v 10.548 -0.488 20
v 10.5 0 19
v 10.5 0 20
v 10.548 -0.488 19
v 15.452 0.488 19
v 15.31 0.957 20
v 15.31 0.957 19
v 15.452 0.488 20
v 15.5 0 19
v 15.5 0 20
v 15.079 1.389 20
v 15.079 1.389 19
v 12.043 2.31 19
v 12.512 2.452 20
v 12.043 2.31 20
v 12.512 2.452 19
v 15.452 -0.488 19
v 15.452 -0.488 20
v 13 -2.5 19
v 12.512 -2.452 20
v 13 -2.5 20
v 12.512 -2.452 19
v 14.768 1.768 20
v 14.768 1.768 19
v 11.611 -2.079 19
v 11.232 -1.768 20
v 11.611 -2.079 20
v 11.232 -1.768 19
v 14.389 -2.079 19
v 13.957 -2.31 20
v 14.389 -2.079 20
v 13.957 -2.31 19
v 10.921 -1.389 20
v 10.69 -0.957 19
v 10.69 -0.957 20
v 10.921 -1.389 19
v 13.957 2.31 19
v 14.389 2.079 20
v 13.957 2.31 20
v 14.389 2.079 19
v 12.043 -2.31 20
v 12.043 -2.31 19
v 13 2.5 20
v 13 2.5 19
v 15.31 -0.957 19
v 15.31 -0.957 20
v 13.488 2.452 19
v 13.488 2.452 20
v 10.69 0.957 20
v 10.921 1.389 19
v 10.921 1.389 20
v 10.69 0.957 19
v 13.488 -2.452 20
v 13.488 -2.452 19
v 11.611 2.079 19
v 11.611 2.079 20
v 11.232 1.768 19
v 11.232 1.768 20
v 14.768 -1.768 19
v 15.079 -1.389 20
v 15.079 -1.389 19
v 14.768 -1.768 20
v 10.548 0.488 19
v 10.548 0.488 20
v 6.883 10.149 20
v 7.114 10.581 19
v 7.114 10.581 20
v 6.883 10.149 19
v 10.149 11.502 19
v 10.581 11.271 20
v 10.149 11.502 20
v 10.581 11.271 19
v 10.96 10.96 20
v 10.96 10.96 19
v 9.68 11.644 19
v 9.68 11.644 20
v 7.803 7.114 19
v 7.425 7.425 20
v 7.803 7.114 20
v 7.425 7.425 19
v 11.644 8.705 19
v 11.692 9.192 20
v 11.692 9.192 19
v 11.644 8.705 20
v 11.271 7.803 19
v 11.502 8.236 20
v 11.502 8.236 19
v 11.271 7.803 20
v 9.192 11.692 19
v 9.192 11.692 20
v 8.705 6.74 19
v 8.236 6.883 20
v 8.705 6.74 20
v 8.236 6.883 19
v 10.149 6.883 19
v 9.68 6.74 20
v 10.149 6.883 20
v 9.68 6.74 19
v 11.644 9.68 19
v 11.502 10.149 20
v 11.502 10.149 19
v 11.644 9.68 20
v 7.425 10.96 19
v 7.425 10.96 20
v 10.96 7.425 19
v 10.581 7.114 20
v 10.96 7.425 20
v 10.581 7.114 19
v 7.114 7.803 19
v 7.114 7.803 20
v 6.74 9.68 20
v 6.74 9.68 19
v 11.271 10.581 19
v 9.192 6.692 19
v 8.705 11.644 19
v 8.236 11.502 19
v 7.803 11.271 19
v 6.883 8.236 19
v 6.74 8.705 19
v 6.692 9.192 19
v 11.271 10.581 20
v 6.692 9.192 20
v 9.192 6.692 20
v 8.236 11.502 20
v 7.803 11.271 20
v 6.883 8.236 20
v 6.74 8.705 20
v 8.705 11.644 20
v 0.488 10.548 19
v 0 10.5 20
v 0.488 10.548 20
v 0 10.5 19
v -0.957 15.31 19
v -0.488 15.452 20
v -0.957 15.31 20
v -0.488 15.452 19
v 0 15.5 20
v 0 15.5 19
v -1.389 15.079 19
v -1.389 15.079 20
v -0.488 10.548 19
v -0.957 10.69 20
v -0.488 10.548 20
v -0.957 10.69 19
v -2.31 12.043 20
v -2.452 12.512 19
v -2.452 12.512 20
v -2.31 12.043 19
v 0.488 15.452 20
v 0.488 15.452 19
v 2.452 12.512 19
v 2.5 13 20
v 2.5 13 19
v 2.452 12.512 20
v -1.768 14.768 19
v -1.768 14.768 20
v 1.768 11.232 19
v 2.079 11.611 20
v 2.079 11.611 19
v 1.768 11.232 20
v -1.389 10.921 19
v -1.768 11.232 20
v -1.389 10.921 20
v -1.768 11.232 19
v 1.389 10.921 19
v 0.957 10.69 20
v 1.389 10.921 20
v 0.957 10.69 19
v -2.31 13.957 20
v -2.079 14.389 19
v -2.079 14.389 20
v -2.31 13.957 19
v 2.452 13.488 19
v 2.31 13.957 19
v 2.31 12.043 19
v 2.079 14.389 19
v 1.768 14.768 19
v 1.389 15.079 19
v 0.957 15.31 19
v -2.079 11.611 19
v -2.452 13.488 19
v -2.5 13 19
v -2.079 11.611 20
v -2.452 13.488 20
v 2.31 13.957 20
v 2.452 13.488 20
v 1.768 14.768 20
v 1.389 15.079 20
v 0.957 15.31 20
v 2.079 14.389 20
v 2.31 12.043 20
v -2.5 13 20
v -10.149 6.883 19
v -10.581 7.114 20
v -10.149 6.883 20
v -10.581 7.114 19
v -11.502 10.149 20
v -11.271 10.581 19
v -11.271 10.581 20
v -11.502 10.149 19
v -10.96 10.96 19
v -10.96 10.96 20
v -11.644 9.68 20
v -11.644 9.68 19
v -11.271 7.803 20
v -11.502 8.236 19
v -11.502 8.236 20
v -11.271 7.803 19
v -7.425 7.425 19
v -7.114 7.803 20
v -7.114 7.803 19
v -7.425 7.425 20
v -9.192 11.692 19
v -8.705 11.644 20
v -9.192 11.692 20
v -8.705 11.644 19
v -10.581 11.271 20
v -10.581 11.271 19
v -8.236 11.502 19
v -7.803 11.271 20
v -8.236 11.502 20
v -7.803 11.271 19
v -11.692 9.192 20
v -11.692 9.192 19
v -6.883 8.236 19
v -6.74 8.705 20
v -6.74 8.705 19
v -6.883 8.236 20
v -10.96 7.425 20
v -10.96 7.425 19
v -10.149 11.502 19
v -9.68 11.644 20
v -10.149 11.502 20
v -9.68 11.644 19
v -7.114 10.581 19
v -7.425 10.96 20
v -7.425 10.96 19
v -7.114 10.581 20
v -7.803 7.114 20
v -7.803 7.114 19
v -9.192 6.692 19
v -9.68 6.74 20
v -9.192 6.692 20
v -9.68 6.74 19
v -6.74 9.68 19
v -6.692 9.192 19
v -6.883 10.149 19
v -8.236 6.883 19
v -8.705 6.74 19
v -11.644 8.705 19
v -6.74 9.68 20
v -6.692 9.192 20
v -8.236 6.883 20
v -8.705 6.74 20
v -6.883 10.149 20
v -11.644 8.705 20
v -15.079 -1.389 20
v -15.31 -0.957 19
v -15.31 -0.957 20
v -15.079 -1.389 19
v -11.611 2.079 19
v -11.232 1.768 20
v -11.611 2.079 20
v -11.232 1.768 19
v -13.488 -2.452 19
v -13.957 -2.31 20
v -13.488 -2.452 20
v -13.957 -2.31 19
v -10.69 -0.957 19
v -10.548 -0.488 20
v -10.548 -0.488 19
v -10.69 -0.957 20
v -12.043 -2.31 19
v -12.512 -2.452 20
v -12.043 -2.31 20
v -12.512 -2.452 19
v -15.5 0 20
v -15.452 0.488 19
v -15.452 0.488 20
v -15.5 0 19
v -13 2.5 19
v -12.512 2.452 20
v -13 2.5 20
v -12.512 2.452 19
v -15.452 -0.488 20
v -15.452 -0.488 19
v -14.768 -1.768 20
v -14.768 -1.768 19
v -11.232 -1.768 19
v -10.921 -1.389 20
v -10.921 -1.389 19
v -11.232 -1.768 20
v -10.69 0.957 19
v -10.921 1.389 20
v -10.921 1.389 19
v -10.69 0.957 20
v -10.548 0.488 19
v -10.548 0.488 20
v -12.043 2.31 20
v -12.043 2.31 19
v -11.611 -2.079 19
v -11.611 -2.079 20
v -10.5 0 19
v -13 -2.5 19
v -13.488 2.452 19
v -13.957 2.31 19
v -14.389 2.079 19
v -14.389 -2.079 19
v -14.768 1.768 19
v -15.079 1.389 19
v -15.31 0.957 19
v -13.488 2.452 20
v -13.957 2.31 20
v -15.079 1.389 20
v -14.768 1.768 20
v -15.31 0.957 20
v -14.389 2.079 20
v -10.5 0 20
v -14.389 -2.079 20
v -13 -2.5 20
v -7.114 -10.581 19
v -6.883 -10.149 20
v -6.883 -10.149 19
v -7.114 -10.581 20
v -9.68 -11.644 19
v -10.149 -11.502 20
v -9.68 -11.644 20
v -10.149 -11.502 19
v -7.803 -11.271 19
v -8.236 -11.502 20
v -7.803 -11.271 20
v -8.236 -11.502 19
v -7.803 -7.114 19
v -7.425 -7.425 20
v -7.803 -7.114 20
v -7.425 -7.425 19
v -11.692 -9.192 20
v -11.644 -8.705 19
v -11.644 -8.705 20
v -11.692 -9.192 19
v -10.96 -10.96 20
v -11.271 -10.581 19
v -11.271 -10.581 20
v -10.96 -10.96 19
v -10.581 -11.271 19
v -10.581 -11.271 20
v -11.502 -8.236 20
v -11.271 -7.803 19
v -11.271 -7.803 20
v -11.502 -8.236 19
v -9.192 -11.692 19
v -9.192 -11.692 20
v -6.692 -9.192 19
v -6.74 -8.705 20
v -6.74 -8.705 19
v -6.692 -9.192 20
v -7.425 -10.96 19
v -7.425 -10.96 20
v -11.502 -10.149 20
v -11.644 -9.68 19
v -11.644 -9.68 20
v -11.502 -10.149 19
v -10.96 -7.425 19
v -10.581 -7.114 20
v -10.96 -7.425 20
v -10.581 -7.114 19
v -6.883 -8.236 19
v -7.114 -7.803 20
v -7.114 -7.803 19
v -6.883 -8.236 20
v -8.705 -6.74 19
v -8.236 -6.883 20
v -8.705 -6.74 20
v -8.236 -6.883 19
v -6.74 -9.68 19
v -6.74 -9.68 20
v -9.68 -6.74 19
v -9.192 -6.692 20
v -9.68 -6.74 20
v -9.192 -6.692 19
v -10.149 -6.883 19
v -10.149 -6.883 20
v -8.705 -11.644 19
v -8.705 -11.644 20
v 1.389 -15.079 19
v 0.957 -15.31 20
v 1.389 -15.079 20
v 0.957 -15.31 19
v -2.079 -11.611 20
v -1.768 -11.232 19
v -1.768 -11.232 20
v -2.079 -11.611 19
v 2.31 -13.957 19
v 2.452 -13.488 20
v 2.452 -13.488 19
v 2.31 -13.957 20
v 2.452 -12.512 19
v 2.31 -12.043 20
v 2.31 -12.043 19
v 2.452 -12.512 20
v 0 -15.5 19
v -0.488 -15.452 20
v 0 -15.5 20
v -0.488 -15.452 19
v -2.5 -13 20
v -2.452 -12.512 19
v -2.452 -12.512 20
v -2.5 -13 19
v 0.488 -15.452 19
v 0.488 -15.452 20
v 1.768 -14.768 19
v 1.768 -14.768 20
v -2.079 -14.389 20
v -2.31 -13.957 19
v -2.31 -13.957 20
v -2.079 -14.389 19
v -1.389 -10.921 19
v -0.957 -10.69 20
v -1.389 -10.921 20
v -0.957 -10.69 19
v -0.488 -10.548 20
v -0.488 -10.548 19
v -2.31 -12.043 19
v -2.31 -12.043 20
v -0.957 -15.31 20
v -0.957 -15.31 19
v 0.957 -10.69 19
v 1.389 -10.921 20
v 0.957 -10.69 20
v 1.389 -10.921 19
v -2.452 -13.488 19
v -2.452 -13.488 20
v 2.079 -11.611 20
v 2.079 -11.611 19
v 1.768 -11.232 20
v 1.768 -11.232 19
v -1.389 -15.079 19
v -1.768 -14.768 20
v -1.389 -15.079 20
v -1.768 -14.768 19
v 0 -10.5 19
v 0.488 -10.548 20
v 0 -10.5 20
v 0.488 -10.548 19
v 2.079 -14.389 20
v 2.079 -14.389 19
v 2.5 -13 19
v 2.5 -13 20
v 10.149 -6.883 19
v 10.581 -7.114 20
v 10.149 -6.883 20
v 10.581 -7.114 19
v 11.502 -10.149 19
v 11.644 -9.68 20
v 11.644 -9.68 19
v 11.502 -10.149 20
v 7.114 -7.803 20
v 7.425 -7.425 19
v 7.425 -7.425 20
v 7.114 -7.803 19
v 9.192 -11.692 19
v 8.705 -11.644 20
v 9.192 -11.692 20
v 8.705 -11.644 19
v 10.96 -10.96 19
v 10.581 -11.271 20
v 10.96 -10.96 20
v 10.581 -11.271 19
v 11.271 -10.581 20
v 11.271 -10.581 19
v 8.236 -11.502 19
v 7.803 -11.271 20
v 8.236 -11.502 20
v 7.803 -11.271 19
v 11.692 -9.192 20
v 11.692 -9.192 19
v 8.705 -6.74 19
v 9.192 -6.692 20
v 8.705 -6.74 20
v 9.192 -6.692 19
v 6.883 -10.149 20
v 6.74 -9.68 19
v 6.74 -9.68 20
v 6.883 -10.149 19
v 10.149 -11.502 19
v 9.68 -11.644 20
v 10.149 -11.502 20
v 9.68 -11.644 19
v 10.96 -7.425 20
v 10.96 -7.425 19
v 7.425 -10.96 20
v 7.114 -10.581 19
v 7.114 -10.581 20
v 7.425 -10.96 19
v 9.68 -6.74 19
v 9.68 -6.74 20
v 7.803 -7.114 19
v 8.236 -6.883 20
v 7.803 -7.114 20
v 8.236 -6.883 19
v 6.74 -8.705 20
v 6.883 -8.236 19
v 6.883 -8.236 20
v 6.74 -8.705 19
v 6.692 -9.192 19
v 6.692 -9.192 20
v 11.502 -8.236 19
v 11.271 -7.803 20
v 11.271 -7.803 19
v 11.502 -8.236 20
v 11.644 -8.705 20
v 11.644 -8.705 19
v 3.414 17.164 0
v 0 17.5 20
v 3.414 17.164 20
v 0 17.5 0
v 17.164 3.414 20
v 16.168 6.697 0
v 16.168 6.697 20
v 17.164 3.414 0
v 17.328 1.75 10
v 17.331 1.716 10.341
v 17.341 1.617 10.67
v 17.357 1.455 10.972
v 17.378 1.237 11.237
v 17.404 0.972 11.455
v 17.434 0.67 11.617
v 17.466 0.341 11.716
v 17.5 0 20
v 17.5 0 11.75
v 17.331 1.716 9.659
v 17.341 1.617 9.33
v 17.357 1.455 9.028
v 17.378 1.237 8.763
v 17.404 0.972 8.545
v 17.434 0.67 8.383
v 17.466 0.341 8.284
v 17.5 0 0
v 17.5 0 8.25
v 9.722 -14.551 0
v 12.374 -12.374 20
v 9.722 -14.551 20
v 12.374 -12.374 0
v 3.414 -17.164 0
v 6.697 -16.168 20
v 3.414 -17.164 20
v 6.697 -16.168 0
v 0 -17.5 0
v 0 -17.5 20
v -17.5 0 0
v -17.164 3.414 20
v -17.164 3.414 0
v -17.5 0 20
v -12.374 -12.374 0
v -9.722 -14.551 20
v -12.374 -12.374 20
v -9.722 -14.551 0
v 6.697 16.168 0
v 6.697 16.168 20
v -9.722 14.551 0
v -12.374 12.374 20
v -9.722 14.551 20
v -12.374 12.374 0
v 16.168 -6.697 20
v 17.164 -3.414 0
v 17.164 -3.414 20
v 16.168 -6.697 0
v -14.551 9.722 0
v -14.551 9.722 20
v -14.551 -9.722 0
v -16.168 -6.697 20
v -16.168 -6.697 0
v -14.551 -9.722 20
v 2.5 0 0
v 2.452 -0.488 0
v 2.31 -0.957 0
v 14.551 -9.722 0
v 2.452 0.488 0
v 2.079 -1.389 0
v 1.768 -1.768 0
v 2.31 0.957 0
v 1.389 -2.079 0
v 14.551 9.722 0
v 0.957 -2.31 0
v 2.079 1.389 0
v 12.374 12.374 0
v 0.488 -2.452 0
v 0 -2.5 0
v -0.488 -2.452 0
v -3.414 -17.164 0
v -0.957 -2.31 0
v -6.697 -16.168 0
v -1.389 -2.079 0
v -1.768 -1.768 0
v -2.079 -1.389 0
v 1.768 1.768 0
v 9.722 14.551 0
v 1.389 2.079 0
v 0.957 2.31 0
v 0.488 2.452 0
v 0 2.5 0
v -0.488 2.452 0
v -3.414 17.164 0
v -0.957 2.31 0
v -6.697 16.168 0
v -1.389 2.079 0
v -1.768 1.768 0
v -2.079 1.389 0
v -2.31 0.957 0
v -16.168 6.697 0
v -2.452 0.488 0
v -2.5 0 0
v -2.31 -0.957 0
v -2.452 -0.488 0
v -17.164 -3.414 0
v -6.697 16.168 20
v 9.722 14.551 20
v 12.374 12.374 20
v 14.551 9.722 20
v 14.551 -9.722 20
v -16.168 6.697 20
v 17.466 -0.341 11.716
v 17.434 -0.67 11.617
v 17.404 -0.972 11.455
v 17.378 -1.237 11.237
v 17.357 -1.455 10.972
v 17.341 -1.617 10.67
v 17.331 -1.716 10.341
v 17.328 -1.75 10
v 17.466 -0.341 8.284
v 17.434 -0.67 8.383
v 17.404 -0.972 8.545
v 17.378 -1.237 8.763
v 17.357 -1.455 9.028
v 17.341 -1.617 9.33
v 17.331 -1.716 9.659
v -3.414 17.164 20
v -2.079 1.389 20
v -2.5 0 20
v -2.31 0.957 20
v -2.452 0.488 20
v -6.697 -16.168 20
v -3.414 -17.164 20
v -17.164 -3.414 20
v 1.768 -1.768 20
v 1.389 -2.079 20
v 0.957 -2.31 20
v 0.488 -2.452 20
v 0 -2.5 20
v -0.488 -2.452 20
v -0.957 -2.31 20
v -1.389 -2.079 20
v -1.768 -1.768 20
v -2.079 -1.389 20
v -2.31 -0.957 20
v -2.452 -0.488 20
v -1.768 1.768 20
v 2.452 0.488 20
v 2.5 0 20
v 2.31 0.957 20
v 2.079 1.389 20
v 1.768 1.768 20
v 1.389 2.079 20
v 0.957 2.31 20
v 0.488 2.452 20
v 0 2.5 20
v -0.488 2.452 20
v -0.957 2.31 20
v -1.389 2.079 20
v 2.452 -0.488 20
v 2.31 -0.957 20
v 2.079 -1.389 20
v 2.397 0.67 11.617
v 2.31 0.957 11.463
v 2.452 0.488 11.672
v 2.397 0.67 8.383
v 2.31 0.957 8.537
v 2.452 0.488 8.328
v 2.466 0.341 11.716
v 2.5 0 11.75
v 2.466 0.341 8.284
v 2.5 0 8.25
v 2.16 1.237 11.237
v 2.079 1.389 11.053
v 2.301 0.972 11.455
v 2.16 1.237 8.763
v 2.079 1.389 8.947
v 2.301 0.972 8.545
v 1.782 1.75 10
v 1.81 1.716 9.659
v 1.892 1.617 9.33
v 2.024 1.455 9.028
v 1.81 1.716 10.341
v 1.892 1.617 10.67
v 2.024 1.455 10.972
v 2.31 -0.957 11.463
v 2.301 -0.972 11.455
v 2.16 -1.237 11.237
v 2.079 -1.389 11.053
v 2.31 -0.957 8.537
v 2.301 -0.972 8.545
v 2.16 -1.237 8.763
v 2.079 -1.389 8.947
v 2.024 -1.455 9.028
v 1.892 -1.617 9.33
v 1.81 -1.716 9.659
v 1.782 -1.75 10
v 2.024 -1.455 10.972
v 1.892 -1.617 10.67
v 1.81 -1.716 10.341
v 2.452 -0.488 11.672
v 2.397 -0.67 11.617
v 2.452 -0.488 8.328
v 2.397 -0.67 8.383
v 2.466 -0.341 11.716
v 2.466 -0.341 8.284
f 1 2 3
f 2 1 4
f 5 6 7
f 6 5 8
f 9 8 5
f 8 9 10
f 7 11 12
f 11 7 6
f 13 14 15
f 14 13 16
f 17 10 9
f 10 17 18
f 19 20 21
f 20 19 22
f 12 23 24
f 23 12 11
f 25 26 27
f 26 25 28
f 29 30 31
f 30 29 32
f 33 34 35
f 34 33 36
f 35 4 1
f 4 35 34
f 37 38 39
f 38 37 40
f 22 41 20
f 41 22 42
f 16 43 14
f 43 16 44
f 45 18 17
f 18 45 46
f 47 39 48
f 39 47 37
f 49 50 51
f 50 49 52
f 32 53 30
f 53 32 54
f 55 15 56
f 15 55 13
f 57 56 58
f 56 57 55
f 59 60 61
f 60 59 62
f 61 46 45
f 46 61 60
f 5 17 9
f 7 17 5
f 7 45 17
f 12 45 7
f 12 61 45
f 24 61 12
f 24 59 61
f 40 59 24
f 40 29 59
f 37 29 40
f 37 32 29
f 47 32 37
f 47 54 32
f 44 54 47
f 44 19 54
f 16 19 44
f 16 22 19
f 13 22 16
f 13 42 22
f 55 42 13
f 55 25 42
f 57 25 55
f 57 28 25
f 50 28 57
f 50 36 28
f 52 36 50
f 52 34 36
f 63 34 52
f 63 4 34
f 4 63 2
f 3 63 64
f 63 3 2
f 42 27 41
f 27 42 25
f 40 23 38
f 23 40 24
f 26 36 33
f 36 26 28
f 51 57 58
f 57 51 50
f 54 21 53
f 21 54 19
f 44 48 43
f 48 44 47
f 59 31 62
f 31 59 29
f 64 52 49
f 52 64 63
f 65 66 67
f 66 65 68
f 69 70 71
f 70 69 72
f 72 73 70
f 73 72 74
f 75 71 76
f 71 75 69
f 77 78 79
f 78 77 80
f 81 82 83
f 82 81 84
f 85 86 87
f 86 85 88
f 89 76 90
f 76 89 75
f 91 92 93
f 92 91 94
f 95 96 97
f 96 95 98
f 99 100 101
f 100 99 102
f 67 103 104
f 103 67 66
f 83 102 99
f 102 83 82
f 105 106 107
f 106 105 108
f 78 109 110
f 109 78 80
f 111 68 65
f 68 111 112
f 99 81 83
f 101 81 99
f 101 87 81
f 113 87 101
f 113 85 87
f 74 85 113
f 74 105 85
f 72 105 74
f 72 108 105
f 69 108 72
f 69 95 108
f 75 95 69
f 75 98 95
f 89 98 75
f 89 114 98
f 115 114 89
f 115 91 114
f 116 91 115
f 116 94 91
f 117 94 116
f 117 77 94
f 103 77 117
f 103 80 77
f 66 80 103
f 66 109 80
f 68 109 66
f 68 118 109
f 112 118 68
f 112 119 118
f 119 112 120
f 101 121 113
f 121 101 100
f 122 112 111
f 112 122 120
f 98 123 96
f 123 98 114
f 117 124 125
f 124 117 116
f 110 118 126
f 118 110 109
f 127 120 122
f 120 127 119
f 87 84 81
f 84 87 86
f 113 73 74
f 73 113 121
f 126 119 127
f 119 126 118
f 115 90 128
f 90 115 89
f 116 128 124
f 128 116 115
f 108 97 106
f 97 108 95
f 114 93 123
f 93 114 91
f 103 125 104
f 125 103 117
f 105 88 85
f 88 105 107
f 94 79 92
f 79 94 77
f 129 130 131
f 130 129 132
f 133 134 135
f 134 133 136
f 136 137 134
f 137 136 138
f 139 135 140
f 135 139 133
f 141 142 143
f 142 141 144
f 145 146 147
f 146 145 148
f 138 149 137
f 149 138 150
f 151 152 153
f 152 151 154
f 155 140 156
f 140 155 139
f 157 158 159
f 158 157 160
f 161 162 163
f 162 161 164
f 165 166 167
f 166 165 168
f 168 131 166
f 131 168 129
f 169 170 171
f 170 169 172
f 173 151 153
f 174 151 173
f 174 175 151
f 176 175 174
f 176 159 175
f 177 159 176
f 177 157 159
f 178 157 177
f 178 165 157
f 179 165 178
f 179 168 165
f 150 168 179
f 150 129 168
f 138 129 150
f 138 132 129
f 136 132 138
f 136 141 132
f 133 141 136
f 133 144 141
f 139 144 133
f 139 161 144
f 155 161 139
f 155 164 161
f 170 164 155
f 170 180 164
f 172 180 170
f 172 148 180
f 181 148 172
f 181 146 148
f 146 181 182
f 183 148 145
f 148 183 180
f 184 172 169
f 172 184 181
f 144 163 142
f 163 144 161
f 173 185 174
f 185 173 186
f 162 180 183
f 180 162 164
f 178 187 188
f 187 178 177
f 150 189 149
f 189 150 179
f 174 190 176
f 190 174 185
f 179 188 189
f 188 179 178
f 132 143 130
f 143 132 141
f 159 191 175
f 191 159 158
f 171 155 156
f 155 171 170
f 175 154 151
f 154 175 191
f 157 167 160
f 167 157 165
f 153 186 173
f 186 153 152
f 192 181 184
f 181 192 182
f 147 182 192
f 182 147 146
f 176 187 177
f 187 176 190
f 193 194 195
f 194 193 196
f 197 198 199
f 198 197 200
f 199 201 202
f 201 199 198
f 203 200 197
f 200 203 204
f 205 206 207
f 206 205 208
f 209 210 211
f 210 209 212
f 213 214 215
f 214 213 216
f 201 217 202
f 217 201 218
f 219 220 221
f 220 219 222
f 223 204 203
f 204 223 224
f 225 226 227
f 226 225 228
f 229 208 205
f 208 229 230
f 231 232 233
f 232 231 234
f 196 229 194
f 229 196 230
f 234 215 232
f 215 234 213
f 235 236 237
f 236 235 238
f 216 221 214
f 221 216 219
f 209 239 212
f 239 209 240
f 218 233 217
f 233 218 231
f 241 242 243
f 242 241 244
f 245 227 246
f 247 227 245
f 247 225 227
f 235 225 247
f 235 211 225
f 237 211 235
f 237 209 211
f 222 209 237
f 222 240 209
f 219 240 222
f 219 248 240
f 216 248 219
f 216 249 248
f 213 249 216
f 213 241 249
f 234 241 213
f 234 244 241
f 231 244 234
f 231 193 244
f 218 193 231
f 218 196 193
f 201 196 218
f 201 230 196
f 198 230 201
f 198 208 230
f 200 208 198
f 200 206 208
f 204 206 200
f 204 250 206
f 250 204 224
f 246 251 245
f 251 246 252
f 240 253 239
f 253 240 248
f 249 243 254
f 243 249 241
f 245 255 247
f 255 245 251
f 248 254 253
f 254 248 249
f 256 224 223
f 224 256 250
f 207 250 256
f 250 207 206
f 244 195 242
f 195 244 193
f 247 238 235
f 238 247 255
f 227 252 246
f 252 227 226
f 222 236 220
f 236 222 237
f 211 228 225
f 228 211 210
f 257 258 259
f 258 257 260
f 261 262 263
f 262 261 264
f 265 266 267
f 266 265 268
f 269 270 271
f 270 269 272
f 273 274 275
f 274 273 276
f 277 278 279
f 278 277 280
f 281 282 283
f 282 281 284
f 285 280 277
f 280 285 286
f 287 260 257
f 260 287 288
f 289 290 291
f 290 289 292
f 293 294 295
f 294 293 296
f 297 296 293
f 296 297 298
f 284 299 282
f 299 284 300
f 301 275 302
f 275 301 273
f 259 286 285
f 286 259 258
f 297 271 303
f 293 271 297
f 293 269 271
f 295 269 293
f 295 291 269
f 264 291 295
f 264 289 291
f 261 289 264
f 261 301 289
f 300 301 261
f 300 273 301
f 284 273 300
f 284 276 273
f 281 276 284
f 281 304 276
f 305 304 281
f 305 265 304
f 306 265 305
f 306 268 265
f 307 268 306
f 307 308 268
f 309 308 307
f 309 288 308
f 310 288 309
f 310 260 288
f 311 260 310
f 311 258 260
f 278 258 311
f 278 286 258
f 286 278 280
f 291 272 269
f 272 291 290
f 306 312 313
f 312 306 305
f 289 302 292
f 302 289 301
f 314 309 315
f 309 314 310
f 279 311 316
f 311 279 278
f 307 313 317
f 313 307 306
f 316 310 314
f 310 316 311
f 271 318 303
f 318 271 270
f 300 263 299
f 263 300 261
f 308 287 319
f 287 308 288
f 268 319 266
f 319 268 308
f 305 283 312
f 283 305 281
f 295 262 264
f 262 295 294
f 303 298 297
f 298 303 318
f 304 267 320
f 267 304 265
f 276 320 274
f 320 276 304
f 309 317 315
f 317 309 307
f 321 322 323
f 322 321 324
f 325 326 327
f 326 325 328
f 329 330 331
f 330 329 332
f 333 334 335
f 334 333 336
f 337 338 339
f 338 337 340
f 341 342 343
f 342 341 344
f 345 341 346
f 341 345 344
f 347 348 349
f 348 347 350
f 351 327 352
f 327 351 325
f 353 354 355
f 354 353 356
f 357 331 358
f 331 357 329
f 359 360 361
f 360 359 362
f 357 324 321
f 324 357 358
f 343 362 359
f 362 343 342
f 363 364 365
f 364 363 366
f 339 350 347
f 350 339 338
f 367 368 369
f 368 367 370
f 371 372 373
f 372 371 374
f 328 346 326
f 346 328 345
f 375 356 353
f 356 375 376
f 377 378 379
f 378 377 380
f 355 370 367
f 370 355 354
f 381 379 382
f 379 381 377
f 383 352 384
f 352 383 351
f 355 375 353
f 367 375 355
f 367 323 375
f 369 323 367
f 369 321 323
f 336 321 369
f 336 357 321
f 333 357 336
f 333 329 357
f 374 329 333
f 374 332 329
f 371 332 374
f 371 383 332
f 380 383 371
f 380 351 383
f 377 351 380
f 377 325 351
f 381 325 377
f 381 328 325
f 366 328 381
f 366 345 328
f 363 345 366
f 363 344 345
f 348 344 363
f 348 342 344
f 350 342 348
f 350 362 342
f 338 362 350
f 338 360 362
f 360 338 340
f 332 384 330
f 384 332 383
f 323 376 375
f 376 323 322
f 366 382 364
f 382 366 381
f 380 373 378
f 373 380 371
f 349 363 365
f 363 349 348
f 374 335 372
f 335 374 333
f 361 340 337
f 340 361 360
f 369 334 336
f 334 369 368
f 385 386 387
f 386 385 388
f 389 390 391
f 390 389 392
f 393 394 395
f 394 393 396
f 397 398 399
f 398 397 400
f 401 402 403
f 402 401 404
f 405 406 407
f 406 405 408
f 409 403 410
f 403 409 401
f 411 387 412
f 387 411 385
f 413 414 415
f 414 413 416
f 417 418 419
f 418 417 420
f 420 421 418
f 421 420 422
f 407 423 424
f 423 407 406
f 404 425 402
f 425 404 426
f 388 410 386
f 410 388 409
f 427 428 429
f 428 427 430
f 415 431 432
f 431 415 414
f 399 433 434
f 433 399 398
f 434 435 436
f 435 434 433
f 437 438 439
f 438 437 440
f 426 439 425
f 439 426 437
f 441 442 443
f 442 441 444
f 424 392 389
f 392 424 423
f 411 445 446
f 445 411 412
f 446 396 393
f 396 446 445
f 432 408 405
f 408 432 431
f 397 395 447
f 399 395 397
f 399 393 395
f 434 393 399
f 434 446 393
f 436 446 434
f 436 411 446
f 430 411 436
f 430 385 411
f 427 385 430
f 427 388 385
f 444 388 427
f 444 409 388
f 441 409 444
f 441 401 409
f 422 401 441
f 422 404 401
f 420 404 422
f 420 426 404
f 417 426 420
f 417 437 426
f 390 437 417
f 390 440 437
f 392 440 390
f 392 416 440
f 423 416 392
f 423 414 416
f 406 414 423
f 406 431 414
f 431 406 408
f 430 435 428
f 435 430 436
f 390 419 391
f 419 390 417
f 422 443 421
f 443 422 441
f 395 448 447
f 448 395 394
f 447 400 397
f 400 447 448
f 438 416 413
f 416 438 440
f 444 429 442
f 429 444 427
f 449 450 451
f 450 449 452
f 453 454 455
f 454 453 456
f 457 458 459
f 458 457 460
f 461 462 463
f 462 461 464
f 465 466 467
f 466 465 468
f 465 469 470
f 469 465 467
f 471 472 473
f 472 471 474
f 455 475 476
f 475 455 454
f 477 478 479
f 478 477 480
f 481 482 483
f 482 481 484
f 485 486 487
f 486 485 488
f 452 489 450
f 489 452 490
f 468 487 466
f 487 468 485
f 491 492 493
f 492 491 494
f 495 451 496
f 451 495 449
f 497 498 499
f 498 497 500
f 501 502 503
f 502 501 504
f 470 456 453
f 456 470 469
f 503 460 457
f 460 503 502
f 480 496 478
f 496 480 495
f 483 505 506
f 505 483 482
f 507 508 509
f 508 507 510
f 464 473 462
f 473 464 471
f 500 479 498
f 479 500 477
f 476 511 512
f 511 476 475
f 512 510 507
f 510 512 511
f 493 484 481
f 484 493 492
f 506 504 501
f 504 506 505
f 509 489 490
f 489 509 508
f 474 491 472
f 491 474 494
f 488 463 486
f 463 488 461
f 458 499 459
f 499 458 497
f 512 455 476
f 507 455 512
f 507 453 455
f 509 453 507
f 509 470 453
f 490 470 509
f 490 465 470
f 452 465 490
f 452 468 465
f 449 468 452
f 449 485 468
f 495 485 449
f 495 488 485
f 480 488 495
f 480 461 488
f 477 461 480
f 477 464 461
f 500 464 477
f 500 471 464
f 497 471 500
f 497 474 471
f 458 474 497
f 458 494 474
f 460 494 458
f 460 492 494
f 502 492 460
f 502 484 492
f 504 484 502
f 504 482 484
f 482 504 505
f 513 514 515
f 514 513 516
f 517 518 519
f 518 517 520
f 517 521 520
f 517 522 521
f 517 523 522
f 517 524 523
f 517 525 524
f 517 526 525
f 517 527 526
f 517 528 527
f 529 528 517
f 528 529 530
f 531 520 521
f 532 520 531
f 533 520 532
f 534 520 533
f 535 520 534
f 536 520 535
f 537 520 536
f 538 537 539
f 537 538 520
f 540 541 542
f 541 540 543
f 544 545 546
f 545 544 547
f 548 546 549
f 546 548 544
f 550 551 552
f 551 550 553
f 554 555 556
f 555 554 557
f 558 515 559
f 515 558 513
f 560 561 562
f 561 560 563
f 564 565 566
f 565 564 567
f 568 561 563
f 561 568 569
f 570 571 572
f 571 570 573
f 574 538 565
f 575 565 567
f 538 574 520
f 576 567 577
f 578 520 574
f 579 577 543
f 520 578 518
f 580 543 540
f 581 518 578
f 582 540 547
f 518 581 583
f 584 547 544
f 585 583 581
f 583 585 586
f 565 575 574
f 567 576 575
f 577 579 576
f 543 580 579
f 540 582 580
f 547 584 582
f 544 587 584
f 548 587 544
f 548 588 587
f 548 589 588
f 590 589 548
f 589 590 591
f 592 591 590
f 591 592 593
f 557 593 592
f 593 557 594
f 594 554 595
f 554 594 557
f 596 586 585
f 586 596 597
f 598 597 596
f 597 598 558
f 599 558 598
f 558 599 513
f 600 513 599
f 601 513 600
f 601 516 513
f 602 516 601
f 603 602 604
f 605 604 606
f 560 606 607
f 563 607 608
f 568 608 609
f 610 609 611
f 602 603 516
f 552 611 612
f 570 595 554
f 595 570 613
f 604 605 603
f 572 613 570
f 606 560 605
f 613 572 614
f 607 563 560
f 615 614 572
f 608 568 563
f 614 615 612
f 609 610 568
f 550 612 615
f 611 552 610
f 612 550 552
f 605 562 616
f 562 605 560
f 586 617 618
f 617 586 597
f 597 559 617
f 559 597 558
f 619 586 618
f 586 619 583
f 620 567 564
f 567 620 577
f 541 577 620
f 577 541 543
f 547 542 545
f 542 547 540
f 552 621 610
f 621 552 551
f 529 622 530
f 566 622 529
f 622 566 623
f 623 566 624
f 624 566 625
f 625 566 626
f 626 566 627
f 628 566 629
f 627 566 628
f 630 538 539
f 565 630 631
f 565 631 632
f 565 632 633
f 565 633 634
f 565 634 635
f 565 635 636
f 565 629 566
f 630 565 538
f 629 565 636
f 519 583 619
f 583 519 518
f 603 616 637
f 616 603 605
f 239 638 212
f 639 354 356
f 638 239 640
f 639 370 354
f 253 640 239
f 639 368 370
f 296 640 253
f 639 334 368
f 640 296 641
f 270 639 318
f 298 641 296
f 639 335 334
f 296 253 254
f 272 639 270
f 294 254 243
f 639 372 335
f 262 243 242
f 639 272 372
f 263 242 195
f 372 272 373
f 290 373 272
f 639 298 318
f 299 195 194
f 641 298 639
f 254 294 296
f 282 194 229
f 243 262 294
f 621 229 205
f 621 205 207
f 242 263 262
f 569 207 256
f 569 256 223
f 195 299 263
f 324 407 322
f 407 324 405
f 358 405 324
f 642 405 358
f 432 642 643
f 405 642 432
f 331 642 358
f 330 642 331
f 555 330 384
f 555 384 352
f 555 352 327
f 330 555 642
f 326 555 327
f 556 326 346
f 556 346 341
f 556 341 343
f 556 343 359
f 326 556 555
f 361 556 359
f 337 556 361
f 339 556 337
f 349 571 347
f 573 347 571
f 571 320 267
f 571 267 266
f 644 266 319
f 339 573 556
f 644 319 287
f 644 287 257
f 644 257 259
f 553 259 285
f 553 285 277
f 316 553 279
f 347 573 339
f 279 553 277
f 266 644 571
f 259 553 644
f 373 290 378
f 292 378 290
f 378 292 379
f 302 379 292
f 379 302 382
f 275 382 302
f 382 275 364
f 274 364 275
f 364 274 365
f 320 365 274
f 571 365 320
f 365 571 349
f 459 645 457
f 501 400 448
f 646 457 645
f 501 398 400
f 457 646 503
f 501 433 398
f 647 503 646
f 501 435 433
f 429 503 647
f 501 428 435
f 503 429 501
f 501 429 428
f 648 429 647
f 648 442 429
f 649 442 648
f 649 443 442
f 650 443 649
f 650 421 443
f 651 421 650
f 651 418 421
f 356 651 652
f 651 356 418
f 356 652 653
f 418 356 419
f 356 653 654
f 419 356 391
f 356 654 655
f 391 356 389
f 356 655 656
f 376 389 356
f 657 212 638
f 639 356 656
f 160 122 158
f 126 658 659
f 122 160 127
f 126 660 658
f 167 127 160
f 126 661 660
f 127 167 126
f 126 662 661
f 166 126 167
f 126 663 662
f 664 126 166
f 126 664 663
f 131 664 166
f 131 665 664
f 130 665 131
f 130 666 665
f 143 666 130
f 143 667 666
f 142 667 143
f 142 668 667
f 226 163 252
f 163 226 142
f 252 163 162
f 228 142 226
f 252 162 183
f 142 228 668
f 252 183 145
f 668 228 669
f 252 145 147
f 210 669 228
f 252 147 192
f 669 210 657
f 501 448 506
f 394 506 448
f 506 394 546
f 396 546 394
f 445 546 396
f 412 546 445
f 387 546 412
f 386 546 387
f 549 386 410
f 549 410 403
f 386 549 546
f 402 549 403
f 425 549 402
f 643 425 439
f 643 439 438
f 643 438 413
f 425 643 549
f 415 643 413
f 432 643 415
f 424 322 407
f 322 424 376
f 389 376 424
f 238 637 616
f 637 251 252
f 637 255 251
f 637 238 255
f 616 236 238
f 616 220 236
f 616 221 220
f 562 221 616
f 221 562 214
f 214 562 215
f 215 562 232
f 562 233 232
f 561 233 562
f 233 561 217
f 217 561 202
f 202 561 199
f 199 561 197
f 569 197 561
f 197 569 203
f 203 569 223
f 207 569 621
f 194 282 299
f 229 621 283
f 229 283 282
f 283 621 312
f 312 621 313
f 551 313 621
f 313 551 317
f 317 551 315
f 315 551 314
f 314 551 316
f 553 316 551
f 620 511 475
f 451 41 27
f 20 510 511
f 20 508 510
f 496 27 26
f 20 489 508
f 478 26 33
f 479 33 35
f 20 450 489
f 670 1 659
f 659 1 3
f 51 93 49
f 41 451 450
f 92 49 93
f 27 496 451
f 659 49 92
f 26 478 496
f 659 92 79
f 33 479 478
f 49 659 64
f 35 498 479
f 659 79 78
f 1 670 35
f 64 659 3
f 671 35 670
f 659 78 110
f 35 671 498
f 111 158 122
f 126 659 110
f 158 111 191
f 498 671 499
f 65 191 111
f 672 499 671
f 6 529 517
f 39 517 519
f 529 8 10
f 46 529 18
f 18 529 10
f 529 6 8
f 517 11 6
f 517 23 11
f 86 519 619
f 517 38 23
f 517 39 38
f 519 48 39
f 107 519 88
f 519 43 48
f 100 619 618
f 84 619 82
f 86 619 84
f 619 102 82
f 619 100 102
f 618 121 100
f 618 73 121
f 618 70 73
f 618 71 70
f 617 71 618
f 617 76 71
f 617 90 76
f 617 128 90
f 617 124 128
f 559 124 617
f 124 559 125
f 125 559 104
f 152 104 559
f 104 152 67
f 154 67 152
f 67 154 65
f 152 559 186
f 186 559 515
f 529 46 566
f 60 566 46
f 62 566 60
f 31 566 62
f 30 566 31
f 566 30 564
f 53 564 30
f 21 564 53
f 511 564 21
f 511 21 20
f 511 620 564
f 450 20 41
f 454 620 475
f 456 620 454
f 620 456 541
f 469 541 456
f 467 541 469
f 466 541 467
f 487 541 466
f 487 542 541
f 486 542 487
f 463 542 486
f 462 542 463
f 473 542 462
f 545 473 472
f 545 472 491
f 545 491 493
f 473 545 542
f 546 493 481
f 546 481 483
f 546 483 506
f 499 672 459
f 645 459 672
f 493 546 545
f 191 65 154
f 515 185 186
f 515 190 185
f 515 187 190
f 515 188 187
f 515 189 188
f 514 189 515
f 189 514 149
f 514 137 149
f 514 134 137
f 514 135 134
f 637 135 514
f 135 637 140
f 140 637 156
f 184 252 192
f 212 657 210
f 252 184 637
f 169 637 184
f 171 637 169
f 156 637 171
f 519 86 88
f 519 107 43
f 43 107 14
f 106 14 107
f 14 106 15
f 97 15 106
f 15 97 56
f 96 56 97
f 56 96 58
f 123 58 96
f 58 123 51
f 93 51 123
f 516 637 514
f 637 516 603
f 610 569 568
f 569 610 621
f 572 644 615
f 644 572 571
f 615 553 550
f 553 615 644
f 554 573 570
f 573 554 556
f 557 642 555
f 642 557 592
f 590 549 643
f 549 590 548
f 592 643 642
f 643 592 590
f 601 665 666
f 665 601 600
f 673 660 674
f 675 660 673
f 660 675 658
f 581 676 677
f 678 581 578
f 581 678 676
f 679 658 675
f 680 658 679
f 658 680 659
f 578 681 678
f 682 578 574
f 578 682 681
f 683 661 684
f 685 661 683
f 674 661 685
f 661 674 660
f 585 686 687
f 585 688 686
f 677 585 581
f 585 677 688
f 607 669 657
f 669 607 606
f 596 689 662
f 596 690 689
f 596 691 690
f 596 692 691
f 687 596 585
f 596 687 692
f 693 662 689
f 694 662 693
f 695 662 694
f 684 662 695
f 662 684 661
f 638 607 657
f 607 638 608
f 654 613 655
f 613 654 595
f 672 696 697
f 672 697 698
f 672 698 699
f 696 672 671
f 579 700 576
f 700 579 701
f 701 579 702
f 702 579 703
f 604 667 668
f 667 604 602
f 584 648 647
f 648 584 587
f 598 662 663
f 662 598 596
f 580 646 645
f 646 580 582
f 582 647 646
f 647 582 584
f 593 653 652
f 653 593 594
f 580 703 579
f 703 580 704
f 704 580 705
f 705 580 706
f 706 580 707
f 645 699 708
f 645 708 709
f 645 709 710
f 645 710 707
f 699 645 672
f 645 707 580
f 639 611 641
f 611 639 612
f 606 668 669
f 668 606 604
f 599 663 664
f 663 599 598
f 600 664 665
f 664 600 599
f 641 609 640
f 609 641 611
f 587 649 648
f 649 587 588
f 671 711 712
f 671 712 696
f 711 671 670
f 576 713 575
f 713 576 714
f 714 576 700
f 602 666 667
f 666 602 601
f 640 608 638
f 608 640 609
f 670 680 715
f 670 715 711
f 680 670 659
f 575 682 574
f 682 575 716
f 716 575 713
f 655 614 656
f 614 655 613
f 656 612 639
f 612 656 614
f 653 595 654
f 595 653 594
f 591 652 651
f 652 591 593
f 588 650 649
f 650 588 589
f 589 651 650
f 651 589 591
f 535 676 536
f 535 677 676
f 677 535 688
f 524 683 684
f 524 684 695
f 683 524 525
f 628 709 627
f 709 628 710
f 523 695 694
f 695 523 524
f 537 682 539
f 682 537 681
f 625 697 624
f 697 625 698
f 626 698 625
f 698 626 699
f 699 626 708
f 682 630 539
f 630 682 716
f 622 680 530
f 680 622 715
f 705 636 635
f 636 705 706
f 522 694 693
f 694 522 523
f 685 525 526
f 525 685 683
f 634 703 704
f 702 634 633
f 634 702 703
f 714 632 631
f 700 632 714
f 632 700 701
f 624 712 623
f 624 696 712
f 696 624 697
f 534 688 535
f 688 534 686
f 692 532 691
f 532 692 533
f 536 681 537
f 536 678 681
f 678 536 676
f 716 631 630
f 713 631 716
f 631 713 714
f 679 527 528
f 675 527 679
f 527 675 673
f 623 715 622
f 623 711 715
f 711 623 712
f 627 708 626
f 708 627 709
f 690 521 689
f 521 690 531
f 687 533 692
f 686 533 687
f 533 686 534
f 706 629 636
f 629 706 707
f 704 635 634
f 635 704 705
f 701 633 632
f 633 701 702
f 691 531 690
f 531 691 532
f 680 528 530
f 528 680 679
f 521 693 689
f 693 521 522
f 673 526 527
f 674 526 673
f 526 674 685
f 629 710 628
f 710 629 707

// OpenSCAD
$fn = 32;

// ----------------------------------------------------------------------
// Control knob: dimpled knob
// ----------------------------------------------------------------------

// --- parameters (mm) ---
dimp_d = 5;               // finger dimple diameter
n_dimp = 8;               // number of dimples
dimp_r = 13;              // dimple ring radius
knob_d = 35;              // knob body diameter
knob_h = 20;              // knob body height
bore_d = 5;               // shaft bore diameter
set_d = 3.5;              // set screw bore diameter

dimp_step = 360 / n_dimp;  // dimple angular step

difference() {
  cylinder(h = knob_h, d = knob_d);
  translate([0, 0, -1]) cylinder(h = knob_h + 2, d = bore_d);
  translate([-1, 0, knob_h / 2]) rotate([0, 90, 0])
    cylinder(h = knob_d / 2 + bore_d / 2 + 2, d = set_d);  for (i = [0 : n_dimp - 1])
    rotate([0, 0, i * dimp_step])
      translate([dimp_r, 0, knob_h - 1])
        cylinder(h = 2, d = dimp_d);
}
